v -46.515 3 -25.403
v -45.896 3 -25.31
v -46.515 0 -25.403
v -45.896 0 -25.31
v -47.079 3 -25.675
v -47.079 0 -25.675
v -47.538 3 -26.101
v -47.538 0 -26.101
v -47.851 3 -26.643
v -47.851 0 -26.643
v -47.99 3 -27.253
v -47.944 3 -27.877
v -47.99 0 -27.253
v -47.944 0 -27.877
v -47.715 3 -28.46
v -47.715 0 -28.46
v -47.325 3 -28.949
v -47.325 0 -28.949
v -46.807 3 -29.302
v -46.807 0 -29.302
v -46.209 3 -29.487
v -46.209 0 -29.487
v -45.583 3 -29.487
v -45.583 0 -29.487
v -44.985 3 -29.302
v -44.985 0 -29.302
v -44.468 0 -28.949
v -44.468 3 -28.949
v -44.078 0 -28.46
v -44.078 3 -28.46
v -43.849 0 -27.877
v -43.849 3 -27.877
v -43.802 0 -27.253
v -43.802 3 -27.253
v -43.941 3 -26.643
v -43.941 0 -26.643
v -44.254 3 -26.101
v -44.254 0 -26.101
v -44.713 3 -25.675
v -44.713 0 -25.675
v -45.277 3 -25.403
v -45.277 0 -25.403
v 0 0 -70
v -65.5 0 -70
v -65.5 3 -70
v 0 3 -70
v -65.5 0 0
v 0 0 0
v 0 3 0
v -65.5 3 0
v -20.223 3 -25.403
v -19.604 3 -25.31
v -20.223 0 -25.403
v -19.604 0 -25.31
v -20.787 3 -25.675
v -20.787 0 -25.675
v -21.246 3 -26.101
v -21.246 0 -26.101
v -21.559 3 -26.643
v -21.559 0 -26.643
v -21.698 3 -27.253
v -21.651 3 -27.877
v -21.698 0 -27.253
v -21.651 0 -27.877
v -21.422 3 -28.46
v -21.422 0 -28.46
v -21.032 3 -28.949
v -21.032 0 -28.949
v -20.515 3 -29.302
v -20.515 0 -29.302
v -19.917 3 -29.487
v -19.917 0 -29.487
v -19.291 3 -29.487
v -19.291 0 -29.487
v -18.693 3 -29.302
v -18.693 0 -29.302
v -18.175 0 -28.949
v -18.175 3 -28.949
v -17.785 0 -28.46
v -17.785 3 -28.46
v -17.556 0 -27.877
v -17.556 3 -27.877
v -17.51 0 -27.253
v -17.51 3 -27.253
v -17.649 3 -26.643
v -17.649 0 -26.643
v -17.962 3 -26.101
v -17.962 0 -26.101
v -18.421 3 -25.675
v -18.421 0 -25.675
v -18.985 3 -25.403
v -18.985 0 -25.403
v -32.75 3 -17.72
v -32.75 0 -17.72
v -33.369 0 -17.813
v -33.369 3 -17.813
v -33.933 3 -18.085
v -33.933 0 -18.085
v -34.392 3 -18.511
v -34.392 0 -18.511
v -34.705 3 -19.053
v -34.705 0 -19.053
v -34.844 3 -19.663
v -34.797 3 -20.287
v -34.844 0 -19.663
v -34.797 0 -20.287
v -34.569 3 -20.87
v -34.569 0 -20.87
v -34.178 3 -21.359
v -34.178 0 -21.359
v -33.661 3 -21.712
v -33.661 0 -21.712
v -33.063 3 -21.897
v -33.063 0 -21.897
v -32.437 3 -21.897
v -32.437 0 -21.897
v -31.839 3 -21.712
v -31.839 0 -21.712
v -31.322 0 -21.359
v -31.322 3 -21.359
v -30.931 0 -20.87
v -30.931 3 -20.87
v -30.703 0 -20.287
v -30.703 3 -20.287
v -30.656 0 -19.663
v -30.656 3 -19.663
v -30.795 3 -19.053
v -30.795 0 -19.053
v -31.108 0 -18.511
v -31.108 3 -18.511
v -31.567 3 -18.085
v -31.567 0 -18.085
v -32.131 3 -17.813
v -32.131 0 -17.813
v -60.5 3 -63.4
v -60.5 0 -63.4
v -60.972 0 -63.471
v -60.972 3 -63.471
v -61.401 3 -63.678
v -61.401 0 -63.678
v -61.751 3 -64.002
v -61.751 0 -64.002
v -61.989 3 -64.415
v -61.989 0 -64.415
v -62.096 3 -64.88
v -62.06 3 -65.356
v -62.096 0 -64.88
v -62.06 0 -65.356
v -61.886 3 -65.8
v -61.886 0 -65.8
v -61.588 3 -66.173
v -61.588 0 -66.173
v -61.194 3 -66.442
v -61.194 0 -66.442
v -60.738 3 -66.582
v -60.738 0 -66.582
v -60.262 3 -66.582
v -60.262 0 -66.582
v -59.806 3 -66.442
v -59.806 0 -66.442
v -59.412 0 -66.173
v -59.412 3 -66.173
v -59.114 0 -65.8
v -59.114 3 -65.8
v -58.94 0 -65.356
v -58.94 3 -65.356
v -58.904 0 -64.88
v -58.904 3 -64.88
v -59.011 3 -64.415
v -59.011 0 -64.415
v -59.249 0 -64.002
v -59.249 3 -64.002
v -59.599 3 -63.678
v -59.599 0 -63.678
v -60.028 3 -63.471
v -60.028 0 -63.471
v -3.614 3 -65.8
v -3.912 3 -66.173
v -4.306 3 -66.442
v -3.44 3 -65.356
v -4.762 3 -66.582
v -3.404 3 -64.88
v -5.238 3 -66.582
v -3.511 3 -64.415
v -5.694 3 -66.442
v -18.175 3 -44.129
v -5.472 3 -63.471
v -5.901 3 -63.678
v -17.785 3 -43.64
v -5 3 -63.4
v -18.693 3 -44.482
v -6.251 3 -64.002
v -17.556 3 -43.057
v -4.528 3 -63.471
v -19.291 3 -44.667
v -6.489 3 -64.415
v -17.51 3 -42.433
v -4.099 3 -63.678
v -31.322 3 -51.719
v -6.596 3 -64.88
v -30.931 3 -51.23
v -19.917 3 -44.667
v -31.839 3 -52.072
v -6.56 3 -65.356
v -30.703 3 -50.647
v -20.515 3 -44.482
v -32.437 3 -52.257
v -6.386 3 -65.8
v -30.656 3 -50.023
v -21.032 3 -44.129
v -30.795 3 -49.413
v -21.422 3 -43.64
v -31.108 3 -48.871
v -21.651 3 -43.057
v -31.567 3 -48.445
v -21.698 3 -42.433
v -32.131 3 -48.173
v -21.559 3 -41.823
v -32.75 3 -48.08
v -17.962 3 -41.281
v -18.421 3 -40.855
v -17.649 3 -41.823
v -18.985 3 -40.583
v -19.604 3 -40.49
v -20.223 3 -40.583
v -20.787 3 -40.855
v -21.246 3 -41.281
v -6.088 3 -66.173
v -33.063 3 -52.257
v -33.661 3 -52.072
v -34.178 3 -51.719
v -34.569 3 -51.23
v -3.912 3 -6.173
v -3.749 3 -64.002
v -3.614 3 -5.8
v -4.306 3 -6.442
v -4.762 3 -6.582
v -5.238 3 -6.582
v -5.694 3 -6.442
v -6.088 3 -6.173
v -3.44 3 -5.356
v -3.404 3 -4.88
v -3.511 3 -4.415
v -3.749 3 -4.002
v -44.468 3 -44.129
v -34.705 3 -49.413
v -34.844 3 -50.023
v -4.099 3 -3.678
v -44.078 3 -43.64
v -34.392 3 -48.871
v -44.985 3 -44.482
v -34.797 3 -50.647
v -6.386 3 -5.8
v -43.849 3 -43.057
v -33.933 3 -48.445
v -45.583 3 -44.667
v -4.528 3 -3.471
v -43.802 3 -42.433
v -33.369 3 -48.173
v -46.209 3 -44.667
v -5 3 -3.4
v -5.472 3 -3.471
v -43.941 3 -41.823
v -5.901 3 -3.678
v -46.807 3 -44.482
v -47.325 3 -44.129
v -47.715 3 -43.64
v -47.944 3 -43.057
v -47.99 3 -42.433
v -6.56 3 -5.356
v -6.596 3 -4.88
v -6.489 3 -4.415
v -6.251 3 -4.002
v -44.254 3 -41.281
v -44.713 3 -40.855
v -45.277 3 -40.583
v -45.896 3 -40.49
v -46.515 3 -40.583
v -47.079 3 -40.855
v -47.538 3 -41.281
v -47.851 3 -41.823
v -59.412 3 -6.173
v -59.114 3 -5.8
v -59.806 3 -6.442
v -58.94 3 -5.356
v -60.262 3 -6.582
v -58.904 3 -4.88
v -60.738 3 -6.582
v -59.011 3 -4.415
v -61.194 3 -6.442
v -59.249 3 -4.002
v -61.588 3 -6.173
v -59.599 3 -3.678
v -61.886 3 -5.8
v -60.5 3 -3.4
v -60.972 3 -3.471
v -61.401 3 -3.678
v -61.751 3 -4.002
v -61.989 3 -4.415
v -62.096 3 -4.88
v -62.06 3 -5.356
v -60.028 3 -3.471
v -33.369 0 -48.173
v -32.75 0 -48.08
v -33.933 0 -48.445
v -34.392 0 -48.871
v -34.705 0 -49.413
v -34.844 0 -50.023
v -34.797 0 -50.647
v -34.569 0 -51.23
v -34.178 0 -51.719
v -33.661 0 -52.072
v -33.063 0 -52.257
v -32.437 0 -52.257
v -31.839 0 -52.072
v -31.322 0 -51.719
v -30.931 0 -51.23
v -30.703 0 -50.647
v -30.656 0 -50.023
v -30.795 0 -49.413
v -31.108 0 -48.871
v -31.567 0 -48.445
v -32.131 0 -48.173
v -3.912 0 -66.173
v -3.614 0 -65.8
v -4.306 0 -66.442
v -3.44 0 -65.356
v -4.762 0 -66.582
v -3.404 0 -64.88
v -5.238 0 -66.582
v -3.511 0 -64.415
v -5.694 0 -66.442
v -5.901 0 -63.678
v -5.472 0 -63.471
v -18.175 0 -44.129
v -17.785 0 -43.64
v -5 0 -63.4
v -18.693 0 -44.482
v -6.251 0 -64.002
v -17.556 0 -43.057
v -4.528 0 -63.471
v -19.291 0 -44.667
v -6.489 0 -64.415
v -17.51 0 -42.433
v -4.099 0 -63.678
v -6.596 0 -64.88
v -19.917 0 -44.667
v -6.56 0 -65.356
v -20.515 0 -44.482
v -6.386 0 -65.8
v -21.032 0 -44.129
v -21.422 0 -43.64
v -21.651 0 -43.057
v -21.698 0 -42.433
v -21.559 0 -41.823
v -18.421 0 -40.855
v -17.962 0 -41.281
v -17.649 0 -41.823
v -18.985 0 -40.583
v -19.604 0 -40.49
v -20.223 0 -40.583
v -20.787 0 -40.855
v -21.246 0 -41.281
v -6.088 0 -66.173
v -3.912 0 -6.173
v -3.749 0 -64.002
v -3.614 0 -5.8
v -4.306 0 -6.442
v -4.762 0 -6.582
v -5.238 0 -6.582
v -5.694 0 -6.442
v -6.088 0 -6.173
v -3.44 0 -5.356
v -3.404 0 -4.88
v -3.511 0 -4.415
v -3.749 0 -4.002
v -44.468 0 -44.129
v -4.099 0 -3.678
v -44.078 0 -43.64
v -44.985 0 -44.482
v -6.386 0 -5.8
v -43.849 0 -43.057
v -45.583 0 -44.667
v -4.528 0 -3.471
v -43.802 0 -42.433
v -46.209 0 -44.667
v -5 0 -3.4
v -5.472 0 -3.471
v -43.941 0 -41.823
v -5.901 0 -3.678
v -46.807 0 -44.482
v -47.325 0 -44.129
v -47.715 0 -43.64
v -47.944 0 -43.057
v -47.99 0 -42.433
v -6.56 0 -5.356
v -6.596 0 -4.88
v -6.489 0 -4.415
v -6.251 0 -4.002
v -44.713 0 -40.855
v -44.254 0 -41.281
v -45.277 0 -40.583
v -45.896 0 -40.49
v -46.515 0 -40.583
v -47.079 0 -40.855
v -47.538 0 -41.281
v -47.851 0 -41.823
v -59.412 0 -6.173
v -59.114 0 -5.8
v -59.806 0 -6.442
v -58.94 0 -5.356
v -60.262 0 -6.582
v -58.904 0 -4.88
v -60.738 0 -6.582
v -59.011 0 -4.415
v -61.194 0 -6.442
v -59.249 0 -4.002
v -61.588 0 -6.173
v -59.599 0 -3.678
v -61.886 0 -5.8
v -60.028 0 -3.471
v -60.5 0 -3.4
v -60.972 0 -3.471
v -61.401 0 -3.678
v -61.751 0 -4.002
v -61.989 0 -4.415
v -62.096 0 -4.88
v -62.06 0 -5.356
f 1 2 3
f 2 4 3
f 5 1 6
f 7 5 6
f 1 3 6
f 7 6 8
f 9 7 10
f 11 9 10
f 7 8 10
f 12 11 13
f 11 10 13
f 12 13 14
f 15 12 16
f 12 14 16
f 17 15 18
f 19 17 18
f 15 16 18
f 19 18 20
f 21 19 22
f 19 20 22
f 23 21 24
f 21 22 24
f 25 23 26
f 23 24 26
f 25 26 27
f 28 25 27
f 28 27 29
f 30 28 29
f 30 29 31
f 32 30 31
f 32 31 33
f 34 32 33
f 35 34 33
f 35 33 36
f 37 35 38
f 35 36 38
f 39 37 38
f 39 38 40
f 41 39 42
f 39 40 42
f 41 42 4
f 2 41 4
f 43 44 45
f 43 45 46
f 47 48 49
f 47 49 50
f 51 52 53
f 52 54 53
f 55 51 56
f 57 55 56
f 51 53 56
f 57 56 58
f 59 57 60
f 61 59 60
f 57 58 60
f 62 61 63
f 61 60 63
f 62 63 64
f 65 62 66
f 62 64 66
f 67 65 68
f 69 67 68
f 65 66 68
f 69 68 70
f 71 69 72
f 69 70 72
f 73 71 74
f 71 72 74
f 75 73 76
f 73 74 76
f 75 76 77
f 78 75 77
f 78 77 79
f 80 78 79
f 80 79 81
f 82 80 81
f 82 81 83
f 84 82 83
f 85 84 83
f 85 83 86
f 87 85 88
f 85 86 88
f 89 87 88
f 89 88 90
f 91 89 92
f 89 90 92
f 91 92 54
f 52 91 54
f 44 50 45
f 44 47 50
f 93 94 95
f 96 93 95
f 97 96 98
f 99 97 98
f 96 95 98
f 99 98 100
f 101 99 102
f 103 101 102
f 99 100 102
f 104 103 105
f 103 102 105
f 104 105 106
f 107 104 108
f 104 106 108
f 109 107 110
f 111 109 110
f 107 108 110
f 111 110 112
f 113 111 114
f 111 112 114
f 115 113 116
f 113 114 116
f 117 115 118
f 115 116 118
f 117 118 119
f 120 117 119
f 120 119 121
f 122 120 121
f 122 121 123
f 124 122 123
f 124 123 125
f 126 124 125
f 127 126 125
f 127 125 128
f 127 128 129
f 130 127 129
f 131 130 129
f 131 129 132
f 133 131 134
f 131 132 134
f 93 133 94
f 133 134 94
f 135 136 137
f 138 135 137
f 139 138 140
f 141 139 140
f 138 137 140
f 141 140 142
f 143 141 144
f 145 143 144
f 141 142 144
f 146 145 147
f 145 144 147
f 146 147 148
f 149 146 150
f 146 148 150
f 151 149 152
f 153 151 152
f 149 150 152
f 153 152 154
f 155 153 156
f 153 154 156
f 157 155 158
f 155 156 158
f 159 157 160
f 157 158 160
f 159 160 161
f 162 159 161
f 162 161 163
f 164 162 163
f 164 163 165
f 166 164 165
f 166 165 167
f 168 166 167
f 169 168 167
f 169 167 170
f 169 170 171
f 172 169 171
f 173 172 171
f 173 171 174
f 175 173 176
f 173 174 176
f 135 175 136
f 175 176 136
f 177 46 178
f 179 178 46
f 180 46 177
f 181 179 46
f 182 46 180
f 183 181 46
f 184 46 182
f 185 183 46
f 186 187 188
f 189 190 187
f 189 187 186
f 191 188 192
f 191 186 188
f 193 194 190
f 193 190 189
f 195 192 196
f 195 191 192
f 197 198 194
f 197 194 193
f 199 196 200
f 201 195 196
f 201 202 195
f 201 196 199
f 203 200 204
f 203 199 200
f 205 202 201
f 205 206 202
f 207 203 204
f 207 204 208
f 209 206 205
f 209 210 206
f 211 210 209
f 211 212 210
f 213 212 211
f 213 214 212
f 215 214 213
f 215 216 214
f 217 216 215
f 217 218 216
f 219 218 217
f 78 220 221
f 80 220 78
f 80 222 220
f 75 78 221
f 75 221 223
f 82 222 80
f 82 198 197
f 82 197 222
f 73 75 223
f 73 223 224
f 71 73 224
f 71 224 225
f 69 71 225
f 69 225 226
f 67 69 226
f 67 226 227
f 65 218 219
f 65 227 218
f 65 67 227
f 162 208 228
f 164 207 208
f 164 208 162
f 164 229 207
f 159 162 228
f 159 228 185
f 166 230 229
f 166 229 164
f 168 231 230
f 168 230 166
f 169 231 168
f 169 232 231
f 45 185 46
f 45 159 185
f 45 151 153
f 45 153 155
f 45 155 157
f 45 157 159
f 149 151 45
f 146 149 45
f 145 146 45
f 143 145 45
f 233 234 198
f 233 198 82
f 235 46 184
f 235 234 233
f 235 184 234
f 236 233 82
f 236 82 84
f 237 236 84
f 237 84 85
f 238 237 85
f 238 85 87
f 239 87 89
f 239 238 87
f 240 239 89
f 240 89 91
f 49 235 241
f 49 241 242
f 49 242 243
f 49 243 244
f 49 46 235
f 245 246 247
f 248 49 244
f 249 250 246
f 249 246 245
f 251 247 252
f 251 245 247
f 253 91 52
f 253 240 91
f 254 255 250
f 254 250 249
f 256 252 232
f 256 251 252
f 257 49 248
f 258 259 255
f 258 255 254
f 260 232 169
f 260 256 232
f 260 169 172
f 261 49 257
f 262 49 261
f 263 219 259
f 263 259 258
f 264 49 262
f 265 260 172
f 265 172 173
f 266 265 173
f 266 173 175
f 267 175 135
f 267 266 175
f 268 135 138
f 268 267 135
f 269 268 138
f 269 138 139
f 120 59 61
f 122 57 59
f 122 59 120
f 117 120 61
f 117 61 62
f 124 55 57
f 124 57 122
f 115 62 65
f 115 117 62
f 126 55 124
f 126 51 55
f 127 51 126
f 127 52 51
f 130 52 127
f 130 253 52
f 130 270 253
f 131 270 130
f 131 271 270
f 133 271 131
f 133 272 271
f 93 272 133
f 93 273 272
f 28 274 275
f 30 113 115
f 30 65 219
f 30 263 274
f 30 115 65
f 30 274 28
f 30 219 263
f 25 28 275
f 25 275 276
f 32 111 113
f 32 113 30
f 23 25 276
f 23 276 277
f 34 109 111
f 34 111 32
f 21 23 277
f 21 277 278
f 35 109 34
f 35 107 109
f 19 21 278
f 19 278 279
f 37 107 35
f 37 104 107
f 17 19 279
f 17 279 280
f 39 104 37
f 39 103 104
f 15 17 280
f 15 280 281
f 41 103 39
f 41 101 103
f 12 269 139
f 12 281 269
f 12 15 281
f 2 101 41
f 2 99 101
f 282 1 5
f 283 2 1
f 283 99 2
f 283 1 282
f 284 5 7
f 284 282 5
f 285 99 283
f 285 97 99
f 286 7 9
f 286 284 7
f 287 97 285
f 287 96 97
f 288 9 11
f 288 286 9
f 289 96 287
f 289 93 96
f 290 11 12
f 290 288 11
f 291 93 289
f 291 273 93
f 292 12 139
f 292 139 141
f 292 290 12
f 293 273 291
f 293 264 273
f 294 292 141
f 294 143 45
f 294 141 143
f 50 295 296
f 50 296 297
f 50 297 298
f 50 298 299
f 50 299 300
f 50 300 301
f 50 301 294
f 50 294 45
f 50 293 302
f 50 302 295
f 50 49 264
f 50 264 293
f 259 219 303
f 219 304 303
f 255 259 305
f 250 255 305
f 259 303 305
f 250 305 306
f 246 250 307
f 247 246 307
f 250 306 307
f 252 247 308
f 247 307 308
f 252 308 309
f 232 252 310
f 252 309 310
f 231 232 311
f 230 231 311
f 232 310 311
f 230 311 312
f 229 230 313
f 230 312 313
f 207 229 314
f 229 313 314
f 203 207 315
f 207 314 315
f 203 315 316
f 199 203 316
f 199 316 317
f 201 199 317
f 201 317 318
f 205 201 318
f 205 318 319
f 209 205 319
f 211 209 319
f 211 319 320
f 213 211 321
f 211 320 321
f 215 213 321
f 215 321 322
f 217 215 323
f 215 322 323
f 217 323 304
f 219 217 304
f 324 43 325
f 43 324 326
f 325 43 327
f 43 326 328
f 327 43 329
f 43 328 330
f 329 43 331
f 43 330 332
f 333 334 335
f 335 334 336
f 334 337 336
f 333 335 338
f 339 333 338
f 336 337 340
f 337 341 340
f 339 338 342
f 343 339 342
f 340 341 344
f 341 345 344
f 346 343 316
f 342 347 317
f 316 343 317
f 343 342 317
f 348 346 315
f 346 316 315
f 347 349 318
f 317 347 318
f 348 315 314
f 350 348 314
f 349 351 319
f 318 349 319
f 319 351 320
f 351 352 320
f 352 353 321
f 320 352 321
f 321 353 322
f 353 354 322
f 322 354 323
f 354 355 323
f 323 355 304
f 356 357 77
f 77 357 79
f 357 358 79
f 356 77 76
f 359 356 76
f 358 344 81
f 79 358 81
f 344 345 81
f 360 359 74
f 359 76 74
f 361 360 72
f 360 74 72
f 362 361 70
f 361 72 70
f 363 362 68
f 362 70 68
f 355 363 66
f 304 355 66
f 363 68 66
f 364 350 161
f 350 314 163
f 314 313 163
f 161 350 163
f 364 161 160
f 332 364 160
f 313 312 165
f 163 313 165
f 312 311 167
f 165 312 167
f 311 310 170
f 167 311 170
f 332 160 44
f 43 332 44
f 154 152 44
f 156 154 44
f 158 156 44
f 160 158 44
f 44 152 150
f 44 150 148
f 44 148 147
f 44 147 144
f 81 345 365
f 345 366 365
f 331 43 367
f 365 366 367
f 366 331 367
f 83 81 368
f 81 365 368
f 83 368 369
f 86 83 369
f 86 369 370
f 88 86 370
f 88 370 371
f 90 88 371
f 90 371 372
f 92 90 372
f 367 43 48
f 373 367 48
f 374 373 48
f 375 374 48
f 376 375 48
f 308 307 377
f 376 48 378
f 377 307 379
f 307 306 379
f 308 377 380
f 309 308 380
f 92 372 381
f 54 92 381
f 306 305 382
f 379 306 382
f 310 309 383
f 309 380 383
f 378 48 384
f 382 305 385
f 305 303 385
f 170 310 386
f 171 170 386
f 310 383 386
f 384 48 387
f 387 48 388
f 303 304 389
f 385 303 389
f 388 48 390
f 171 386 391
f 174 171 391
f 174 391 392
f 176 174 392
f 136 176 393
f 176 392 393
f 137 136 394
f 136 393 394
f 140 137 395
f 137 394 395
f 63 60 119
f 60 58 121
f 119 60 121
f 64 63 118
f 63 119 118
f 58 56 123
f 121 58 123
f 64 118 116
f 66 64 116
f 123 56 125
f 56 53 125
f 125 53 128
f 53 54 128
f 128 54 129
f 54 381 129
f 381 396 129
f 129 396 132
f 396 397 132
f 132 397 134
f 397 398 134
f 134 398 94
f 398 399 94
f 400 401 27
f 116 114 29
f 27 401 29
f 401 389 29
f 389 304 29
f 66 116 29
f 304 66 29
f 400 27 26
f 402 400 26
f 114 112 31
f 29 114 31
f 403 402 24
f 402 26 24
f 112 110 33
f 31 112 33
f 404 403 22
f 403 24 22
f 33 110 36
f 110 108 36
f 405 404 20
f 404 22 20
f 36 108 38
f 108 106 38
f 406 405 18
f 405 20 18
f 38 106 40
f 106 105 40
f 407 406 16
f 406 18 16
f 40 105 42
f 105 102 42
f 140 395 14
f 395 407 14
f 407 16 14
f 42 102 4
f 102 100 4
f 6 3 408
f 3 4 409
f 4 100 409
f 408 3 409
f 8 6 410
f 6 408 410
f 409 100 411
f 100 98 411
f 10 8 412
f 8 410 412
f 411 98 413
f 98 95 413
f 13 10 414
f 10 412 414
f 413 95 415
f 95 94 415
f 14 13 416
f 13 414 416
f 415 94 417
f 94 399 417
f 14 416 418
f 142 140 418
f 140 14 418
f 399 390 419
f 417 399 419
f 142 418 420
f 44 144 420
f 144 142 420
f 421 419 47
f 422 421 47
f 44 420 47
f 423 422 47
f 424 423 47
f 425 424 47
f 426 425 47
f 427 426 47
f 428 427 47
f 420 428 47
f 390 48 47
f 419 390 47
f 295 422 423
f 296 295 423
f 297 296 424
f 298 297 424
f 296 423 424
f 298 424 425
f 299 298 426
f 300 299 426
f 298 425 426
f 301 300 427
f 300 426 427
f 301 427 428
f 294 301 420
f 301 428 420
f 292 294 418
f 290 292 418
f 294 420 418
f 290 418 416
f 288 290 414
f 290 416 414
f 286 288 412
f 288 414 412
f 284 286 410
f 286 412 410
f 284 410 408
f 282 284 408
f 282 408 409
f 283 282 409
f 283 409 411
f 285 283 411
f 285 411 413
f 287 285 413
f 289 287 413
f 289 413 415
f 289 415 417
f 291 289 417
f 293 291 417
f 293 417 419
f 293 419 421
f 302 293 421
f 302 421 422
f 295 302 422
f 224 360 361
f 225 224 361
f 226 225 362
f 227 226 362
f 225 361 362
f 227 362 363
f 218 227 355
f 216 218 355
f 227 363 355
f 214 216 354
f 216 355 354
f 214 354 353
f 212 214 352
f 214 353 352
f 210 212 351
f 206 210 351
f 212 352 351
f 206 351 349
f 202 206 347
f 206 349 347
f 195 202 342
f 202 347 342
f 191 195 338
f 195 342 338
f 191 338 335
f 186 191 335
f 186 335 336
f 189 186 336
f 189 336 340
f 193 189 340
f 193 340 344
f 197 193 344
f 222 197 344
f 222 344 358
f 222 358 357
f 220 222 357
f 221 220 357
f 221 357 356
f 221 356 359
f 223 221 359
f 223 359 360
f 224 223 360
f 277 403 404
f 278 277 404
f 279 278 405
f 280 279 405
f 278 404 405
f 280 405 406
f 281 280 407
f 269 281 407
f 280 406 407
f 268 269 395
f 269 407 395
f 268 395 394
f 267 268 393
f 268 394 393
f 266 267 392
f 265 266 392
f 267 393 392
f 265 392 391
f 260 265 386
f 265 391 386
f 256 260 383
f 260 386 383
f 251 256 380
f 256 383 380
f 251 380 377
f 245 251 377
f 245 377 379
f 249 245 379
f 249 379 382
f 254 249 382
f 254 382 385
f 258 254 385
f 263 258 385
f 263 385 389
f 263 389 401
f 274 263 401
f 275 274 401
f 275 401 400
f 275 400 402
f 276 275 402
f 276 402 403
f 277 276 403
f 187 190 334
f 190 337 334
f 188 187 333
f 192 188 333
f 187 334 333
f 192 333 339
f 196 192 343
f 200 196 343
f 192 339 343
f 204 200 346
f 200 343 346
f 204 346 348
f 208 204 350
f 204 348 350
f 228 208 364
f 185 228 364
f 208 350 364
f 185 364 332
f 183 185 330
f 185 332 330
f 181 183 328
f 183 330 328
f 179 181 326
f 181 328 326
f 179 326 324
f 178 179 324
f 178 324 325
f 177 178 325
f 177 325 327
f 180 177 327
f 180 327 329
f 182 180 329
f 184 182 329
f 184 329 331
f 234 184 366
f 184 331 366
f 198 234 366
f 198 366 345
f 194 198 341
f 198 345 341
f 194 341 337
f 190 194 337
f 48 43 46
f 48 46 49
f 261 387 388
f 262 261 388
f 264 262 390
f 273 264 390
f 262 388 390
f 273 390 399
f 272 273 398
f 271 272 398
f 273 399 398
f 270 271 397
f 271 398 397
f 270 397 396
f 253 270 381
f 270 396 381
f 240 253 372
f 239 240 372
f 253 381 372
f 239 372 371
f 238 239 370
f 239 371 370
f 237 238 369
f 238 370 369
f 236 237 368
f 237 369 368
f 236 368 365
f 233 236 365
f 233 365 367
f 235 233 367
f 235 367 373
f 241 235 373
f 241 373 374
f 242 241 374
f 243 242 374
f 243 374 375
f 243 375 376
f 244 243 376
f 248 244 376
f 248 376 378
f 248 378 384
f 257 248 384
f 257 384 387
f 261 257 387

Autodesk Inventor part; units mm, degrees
ref_plane "YZ Plane" through (0, 0, 0) normal (1, 0, 0) x (0, 1, 0)
ref_plane "XZ Plane" through (0, 0, 0) normal (0, 1, 0) x (-1, 0, 0)
ref_plane "XY Plane" through (0, 0, 0) normal (0, 0, 1) x (1, 0, 0)
sketch "スケッチ1" plane through (0, 0, 0) normal (0, 1, 0) x (-1, 0, 0)
  line L0 (0, 0) -> (65.5, 0)
  line L1 (65.5, 0) -> (65.5, -70)
  line L2 (65.5, -70) -> (0, -70)
  line L3 (0, -70) -> (0, 0)
  dimension "d0" = 65.5
  dimension "d1" = 70
extrude "押し出し1" add sketch "スケッチ1" along normal blind 3
sketch "スケッチ2" plane through (0, 3, 0) normal (0, 1, 0) x (1, 0, 0)
  line L0 (-60.5, 5) -> (-5, 5)
  line L1 (-5, 5) -> (-5, 65)
  line L2 (-5, 65) -> (-60.5, 65)
  line L3 (-60.5, 65) -> (-60.5, 5)
  line L4 (-65.5, 0) -> (0, 0) projected
  line L5 (-65.5, 70) -> (-65.5, 0) projected
  dimension "d4" = 55.5
  dimension "d5" = 60
  dimension "d6" = 5
  dimension "d7" = 5
hole "穴1" at (-60.5, 3, -5) at (-5, 3, -5) at (-60.5, 3, -65) at (-5, 3, -65) direction (0, -1, 0) diameter 3.2 end through all
sketch "スケッチ3" plane through (0, 3, 0) normal (0, 1, 0) x (1, 0, 0)
  line L0 (-65.5, 0) -> (0, 0) projected
  line L1 (-32.75, 0) -> (-32.75, 70)
  line L2 (0, 70) -> (-65.5, 70) projected
  circle A0 centre (-32.75, 35) radius 15.18
  line L3 (0, 70) -> (-65.5, 70) projected
  line L4 (-65.5, 70) -> (-65.5, 0) projected
  point P0 (-32.75, 50.18)
  point P1 (-45.8963, 42.59)
  point P2 (-45.8963, 27.41)
  point P3 (-32.75, 19.82)
  point P4 (-19.6037, 27.41)
  point P5 (-19.6037, 42.59)
  dimension "d15" = 30.36
  dimension "d18" = 360
  dimension "d27" = 32.75
hole "穴2" at (-32.75, 3, -50.18) at (-45.8963, 3, -42.59) at (-45.8963, 3, -27.41) at (-32.75, 3, -19.82) at (-19.6037, 3, -27.41) at (-19.6037, 3, -42.59) direction (0, -1, 0) diameter 4.2 end through all
properties part number "link2_plate4" material "アルミニウム 6061"
